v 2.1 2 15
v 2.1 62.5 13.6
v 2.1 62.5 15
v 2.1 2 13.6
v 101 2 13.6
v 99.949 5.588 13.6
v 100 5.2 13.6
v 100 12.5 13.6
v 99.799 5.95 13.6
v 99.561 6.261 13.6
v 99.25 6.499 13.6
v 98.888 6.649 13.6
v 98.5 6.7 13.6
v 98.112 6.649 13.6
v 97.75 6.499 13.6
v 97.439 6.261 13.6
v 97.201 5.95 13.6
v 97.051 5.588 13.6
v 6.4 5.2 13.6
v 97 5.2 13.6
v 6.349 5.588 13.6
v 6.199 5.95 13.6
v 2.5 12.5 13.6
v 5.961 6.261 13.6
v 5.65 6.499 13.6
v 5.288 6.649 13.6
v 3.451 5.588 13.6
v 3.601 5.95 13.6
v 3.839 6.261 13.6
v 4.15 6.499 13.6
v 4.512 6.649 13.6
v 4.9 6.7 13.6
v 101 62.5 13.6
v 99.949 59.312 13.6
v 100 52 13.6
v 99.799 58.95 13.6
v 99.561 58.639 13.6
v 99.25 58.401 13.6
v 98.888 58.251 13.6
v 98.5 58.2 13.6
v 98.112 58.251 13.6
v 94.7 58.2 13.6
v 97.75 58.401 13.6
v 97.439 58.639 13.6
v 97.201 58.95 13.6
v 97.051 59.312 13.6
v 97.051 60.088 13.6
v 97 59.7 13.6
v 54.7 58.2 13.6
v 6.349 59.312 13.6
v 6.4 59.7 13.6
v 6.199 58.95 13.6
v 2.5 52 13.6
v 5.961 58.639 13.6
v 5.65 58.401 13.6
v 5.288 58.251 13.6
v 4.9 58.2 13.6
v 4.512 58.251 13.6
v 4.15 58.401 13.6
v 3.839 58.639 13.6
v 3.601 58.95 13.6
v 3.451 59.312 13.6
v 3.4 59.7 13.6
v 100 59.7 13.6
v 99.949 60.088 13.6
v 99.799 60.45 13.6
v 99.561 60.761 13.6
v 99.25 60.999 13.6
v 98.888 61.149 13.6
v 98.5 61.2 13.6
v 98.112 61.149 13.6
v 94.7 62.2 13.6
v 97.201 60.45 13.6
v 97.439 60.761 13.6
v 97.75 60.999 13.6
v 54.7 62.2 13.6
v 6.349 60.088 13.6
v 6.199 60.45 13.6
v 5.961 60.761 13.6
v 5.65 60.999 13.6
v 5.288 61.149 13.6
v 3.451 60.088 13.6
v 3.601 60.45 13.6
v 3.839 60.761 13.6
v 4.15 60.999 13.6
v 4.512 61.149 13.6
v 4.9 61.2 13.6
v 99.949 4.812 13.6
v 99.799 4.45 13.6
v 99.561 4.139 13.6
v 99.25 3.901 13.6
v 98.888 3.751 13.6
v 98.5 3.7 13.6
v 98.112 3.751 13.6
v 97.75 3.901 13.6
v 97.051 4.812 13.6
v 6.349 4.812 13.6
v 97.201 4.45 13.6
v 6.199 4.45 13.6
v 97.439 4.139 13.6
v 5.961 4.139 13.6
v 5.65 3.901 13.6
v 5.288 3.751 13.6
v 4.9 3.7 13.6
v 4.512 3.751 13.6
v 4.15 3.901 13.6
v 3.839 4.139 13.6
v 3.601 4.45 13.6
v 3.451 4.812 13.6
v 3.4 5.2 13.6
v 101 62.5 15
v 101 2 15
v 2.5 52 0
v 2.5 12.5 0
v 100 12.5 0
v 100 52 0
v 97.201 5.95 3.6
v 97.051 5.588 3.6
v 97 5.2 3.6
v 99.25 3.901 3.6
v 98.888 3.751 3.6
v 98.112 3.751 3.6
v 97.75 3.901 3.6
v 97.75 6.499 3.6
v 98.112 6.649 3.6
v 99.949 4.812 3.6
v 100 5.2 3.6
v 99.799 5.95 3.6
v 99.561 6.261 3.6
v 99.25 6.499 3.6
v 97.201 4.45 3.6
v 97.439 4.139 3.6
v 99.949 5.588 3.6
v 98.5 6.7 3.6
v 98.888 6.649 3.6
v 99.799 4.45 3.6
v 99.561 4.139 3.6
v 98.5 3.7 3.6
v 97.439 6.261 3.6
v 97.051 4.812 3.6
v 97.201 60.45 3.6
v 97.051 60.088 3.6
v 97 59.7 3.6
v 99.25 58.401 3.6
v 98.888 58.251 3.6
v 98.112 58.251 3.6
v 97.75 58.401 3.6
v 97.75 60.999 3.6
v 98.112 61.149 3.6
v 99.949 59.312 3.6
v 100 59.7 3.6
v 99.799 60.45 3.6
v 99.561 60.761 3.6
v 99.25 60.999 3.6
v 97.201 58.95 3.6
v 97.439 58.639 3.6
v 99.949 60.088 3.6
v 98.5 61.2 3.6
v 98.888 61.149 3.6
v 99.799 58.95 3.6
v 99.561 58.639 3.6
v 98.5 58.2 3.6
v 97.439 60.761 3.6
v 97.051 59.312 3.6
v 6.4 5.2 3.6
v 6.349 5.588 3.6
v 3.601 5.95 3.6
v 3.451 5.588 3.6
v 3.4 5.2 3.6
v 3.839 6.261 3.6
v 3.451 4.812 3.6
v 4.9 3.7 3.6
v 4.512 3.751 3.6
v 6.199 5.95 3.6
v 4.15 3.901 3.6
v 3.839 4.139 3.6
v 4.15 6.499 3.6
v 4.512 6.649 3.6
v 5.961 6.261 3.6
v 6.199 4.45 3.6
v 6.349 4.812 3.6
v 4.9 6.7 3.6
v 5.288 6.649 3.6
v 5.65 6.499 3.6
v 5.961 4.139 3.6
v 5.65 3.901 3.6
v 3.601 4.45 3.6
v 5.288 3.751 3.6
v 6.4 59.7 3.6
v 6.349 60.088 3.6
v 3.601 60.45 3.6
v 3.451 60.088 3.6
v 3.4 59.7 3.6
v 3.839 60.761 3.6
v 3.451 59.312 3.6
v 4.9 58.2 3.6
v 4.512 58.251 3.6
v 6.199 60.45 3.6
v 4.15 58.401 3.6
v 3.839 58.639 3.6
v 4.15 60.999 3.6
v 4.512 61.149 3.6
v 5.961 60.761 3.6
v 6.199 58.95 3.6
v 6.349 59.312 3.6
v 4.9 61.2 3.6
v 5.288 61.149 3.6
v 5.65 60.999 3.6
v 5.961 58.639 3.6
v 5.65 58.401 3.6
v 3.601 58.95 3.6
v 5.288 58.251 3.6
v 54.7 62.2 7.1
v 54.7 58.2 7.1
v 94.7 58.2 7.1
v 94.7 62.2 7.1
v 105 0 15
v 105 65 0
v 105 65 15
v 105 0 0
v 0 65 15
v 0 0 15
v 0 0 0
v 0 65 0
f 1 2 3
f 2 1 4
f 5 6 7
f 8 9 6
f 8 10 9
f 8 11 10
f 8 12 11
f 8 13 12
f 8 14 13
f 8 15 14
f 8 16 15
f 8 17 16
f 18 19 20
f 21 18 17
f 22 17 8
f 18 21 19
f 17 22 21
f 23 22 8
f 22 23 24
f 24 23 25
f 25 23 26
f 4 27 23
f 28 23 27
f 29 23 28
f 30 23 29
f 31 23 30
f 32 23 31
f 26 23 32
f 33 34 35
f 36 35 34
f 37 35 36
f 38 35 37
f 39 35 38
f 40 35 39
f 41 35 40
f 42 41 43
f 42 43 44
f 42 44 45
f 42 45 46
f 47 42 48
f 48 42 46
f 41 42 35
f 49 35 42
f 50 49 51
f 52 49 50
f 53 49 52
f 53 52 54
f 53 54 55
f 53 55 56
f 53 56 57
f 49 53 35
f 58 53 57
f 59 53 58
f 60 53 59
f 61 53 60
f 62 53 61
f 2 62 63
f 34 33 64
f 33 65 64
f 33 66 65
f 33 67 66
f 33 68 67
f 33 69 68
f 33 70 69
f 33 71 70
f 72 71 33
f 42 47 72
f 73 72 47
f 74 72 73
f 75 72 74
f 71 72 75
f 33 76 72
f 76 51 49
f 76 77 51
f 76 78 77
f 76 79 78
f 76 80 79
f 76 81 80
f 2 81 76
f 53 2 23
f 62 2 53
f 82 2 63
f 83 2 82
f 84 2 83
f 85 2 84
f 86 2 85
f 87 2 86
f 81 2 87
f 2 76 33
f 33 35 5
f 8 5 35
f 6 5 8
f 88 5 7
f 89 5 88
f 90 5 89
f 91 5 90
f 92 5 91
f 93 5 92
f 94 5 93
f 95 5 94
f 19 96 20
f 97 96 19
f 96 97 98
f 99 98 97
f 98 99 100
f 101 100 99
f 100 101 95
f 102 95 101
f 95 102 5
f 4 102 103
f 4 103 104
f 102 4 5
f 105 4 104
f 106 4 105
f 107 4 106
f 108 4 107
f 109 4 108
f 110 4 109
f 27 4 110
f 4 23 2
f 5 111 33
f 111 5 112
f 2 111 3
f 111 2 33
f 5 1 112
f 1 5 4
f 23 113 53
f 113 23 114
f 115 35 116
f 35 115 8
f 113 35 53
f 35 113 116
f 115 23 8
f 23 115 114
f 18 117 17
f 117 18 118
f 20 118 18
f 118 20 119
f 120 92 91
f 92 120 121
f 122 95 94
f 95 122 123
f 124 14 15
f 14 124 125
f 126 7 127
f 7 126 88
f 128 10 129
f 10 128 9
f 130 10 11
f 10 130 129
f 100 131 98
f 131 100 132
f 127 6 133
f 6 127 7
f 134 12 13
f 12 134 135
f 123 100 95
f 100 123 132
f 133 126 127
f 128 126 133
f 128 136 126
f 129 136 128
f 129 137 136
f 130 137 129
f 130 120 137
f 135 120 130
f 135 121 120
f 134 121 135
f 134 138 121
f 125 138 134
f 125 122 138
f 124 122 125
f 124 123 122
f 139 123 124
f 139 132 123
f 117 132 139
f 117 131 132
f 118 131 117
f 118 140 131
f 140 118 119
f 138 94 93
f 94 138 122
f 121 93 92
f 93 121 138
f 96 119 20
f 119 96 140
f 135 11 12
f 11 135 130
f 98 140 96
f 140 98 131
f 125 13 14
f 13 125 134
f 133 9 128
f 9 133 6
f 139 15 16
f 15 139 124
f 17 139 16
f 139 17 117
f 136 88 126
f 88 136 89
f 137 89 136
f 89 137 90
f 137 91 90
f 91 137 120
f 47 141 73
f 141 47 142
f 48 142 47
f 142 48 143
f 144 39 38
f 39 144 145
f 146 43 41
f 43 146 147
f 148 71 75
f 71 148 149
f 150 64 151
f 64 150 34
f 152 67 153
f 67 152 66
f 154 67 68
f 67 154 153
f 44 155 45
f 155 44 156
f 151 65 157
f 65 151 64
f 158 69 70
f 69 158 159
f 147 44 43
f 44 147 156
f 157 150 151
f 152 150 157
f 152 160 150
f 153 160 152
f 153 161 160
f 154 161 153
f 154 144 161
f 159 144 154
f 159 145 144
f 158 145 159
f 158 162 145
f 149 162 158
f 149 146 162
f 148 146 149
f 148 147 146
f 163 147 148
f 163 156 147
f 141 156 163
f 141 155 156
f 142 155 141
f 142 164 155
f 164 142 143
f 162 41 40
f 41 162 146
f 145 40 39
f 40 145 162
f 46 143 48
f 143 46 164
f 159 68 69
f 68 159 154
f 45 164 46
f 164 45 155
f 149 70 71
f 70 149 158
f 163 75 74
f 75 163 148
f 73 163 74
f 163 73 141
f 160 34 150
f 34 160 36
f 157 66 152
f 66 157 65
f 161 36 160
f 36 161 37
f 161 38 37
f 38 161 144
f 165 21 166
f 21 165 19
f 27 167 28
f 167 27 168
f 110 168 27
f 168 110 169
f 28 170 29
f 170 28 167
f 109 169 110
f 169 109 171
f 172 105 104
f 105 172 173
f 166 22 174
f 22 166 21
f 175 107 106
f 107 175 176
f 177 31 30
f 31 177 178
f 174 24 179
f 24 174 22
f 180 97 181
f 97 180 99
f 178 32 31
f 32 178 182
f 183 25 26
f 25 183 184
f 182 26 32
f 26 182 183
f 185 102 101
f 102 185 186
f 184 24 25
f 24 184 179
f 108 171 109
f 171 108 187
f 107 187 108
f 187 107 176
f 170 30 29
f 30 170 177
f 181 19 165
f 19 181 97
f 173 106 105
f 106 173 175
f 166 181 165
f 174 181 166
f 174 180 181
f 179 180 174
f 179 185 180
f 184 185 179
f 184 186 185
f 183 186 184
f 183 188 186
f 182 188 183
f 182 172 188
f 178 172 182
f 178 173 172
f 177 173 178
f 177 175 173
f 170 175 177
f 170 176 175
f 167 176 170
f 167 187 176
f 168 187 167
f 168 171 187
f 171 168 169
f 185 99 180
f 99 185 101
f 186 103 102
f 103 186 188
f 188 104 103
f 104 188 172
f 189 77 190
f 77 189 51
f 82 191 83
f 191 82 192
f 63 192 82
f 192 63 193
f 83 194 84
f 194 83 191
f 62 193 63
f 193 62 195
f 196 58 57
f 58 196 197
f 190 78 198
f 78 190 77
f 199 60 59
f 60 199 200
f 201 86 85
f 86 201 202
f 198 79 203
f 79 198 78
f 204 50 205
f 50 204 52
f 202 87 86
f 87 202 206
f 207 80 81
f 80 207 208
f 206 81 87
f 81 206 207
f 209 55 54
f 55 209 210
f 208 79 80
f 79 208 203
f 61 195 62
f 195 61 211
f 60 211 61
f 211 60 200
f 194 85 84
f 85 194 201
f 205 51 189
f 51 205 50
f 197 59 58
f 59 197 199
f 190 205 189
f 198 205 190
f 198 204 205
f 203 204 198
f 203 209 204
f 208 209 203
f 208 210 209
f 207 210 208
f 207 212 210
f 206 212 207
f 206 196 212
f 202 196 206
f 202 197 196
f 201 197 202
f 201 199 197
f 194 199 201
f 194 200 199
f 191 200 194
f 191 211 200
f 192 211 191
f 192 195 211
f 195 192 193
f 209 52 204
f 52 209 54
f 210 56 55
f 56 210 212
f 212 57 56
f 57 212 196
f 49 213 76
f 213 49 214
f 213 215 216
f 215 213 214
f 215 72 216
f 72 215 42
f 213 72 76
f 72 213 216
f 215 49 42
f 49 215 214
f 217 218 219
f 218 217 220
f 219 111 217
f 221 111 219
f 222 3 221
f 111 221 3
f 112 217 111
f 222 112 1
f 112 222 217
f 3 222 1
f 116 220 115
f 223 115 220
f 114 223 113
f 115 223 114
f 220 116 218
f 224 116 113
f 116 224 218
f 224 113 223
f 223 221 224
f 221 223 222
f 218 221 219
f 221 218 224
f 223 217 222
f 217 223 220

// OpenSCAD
// file: lcd_screen.scad
module lcd_screen(screen_thickness = 0, screws_length = 0) {
    union() {

        // Base board
        color("green")
            cube([98.9, 60.5, 1.5]);

        // LCD Screen
        color("gray")
            translate([1, 50-39.5, 1.49])
                cube([97.5, 39.5, 9.01]);
        // Screen thickness addition
        color("gray")
            translate([1, 50-39.5, 1.49 + 9])
                cube([97.5, 39.5, screen_thickness]);

        // Bottom left hole
        translate([1 + 1.5, 50-39.5 - 5.8 - 1.5, -0.01])
            cylinder(r = 1.5, 1.51 + screws_length);

        // Upper left hole
        translate([1 + 1.5, 50-39.5 - 5.8 - 1.5 + 51.5+3, -0.01])
            cylinder(r = 1.5, 1.51 + screws_length);

        // Bottom right hole
        translate([1 + 1.5 + 90.6 + 3, 50-39.5 - 5.8 - 1.5, -0.01])
            cylinder(r = 1.5, 1.51 + screws_length);

        // Upper right hole
        translate([1 + 1.5 + 90.6 + 3, 50-39.5 - 5.8 - 1.5 + 51.5 + 3, -0.01])
            cylinder(r = 1.5, 1.51 + screws_length);

        // Pins hole
        translate([6.3, 50-39.5 - 5.8 - 1.5 + 51.5 + 1.5, 0]) {
            cube(size=[40, 4, 8]);
        }

        // Controller board
        translate([-10, 60.5 - 23, -7.95]) 
        cube([67, 23, 8]);
    }
}
// main file
include <lcd_screen.scad>

$fa = 1;
$fs = 0.4;

difference() {
    cube([105, 65, 15]);

    translate([101, 2, 15.1]) 
        rotate([0, 180, 0])
            lcd_screen(screen_thickness = 5, screws_length = 10);
    
}
